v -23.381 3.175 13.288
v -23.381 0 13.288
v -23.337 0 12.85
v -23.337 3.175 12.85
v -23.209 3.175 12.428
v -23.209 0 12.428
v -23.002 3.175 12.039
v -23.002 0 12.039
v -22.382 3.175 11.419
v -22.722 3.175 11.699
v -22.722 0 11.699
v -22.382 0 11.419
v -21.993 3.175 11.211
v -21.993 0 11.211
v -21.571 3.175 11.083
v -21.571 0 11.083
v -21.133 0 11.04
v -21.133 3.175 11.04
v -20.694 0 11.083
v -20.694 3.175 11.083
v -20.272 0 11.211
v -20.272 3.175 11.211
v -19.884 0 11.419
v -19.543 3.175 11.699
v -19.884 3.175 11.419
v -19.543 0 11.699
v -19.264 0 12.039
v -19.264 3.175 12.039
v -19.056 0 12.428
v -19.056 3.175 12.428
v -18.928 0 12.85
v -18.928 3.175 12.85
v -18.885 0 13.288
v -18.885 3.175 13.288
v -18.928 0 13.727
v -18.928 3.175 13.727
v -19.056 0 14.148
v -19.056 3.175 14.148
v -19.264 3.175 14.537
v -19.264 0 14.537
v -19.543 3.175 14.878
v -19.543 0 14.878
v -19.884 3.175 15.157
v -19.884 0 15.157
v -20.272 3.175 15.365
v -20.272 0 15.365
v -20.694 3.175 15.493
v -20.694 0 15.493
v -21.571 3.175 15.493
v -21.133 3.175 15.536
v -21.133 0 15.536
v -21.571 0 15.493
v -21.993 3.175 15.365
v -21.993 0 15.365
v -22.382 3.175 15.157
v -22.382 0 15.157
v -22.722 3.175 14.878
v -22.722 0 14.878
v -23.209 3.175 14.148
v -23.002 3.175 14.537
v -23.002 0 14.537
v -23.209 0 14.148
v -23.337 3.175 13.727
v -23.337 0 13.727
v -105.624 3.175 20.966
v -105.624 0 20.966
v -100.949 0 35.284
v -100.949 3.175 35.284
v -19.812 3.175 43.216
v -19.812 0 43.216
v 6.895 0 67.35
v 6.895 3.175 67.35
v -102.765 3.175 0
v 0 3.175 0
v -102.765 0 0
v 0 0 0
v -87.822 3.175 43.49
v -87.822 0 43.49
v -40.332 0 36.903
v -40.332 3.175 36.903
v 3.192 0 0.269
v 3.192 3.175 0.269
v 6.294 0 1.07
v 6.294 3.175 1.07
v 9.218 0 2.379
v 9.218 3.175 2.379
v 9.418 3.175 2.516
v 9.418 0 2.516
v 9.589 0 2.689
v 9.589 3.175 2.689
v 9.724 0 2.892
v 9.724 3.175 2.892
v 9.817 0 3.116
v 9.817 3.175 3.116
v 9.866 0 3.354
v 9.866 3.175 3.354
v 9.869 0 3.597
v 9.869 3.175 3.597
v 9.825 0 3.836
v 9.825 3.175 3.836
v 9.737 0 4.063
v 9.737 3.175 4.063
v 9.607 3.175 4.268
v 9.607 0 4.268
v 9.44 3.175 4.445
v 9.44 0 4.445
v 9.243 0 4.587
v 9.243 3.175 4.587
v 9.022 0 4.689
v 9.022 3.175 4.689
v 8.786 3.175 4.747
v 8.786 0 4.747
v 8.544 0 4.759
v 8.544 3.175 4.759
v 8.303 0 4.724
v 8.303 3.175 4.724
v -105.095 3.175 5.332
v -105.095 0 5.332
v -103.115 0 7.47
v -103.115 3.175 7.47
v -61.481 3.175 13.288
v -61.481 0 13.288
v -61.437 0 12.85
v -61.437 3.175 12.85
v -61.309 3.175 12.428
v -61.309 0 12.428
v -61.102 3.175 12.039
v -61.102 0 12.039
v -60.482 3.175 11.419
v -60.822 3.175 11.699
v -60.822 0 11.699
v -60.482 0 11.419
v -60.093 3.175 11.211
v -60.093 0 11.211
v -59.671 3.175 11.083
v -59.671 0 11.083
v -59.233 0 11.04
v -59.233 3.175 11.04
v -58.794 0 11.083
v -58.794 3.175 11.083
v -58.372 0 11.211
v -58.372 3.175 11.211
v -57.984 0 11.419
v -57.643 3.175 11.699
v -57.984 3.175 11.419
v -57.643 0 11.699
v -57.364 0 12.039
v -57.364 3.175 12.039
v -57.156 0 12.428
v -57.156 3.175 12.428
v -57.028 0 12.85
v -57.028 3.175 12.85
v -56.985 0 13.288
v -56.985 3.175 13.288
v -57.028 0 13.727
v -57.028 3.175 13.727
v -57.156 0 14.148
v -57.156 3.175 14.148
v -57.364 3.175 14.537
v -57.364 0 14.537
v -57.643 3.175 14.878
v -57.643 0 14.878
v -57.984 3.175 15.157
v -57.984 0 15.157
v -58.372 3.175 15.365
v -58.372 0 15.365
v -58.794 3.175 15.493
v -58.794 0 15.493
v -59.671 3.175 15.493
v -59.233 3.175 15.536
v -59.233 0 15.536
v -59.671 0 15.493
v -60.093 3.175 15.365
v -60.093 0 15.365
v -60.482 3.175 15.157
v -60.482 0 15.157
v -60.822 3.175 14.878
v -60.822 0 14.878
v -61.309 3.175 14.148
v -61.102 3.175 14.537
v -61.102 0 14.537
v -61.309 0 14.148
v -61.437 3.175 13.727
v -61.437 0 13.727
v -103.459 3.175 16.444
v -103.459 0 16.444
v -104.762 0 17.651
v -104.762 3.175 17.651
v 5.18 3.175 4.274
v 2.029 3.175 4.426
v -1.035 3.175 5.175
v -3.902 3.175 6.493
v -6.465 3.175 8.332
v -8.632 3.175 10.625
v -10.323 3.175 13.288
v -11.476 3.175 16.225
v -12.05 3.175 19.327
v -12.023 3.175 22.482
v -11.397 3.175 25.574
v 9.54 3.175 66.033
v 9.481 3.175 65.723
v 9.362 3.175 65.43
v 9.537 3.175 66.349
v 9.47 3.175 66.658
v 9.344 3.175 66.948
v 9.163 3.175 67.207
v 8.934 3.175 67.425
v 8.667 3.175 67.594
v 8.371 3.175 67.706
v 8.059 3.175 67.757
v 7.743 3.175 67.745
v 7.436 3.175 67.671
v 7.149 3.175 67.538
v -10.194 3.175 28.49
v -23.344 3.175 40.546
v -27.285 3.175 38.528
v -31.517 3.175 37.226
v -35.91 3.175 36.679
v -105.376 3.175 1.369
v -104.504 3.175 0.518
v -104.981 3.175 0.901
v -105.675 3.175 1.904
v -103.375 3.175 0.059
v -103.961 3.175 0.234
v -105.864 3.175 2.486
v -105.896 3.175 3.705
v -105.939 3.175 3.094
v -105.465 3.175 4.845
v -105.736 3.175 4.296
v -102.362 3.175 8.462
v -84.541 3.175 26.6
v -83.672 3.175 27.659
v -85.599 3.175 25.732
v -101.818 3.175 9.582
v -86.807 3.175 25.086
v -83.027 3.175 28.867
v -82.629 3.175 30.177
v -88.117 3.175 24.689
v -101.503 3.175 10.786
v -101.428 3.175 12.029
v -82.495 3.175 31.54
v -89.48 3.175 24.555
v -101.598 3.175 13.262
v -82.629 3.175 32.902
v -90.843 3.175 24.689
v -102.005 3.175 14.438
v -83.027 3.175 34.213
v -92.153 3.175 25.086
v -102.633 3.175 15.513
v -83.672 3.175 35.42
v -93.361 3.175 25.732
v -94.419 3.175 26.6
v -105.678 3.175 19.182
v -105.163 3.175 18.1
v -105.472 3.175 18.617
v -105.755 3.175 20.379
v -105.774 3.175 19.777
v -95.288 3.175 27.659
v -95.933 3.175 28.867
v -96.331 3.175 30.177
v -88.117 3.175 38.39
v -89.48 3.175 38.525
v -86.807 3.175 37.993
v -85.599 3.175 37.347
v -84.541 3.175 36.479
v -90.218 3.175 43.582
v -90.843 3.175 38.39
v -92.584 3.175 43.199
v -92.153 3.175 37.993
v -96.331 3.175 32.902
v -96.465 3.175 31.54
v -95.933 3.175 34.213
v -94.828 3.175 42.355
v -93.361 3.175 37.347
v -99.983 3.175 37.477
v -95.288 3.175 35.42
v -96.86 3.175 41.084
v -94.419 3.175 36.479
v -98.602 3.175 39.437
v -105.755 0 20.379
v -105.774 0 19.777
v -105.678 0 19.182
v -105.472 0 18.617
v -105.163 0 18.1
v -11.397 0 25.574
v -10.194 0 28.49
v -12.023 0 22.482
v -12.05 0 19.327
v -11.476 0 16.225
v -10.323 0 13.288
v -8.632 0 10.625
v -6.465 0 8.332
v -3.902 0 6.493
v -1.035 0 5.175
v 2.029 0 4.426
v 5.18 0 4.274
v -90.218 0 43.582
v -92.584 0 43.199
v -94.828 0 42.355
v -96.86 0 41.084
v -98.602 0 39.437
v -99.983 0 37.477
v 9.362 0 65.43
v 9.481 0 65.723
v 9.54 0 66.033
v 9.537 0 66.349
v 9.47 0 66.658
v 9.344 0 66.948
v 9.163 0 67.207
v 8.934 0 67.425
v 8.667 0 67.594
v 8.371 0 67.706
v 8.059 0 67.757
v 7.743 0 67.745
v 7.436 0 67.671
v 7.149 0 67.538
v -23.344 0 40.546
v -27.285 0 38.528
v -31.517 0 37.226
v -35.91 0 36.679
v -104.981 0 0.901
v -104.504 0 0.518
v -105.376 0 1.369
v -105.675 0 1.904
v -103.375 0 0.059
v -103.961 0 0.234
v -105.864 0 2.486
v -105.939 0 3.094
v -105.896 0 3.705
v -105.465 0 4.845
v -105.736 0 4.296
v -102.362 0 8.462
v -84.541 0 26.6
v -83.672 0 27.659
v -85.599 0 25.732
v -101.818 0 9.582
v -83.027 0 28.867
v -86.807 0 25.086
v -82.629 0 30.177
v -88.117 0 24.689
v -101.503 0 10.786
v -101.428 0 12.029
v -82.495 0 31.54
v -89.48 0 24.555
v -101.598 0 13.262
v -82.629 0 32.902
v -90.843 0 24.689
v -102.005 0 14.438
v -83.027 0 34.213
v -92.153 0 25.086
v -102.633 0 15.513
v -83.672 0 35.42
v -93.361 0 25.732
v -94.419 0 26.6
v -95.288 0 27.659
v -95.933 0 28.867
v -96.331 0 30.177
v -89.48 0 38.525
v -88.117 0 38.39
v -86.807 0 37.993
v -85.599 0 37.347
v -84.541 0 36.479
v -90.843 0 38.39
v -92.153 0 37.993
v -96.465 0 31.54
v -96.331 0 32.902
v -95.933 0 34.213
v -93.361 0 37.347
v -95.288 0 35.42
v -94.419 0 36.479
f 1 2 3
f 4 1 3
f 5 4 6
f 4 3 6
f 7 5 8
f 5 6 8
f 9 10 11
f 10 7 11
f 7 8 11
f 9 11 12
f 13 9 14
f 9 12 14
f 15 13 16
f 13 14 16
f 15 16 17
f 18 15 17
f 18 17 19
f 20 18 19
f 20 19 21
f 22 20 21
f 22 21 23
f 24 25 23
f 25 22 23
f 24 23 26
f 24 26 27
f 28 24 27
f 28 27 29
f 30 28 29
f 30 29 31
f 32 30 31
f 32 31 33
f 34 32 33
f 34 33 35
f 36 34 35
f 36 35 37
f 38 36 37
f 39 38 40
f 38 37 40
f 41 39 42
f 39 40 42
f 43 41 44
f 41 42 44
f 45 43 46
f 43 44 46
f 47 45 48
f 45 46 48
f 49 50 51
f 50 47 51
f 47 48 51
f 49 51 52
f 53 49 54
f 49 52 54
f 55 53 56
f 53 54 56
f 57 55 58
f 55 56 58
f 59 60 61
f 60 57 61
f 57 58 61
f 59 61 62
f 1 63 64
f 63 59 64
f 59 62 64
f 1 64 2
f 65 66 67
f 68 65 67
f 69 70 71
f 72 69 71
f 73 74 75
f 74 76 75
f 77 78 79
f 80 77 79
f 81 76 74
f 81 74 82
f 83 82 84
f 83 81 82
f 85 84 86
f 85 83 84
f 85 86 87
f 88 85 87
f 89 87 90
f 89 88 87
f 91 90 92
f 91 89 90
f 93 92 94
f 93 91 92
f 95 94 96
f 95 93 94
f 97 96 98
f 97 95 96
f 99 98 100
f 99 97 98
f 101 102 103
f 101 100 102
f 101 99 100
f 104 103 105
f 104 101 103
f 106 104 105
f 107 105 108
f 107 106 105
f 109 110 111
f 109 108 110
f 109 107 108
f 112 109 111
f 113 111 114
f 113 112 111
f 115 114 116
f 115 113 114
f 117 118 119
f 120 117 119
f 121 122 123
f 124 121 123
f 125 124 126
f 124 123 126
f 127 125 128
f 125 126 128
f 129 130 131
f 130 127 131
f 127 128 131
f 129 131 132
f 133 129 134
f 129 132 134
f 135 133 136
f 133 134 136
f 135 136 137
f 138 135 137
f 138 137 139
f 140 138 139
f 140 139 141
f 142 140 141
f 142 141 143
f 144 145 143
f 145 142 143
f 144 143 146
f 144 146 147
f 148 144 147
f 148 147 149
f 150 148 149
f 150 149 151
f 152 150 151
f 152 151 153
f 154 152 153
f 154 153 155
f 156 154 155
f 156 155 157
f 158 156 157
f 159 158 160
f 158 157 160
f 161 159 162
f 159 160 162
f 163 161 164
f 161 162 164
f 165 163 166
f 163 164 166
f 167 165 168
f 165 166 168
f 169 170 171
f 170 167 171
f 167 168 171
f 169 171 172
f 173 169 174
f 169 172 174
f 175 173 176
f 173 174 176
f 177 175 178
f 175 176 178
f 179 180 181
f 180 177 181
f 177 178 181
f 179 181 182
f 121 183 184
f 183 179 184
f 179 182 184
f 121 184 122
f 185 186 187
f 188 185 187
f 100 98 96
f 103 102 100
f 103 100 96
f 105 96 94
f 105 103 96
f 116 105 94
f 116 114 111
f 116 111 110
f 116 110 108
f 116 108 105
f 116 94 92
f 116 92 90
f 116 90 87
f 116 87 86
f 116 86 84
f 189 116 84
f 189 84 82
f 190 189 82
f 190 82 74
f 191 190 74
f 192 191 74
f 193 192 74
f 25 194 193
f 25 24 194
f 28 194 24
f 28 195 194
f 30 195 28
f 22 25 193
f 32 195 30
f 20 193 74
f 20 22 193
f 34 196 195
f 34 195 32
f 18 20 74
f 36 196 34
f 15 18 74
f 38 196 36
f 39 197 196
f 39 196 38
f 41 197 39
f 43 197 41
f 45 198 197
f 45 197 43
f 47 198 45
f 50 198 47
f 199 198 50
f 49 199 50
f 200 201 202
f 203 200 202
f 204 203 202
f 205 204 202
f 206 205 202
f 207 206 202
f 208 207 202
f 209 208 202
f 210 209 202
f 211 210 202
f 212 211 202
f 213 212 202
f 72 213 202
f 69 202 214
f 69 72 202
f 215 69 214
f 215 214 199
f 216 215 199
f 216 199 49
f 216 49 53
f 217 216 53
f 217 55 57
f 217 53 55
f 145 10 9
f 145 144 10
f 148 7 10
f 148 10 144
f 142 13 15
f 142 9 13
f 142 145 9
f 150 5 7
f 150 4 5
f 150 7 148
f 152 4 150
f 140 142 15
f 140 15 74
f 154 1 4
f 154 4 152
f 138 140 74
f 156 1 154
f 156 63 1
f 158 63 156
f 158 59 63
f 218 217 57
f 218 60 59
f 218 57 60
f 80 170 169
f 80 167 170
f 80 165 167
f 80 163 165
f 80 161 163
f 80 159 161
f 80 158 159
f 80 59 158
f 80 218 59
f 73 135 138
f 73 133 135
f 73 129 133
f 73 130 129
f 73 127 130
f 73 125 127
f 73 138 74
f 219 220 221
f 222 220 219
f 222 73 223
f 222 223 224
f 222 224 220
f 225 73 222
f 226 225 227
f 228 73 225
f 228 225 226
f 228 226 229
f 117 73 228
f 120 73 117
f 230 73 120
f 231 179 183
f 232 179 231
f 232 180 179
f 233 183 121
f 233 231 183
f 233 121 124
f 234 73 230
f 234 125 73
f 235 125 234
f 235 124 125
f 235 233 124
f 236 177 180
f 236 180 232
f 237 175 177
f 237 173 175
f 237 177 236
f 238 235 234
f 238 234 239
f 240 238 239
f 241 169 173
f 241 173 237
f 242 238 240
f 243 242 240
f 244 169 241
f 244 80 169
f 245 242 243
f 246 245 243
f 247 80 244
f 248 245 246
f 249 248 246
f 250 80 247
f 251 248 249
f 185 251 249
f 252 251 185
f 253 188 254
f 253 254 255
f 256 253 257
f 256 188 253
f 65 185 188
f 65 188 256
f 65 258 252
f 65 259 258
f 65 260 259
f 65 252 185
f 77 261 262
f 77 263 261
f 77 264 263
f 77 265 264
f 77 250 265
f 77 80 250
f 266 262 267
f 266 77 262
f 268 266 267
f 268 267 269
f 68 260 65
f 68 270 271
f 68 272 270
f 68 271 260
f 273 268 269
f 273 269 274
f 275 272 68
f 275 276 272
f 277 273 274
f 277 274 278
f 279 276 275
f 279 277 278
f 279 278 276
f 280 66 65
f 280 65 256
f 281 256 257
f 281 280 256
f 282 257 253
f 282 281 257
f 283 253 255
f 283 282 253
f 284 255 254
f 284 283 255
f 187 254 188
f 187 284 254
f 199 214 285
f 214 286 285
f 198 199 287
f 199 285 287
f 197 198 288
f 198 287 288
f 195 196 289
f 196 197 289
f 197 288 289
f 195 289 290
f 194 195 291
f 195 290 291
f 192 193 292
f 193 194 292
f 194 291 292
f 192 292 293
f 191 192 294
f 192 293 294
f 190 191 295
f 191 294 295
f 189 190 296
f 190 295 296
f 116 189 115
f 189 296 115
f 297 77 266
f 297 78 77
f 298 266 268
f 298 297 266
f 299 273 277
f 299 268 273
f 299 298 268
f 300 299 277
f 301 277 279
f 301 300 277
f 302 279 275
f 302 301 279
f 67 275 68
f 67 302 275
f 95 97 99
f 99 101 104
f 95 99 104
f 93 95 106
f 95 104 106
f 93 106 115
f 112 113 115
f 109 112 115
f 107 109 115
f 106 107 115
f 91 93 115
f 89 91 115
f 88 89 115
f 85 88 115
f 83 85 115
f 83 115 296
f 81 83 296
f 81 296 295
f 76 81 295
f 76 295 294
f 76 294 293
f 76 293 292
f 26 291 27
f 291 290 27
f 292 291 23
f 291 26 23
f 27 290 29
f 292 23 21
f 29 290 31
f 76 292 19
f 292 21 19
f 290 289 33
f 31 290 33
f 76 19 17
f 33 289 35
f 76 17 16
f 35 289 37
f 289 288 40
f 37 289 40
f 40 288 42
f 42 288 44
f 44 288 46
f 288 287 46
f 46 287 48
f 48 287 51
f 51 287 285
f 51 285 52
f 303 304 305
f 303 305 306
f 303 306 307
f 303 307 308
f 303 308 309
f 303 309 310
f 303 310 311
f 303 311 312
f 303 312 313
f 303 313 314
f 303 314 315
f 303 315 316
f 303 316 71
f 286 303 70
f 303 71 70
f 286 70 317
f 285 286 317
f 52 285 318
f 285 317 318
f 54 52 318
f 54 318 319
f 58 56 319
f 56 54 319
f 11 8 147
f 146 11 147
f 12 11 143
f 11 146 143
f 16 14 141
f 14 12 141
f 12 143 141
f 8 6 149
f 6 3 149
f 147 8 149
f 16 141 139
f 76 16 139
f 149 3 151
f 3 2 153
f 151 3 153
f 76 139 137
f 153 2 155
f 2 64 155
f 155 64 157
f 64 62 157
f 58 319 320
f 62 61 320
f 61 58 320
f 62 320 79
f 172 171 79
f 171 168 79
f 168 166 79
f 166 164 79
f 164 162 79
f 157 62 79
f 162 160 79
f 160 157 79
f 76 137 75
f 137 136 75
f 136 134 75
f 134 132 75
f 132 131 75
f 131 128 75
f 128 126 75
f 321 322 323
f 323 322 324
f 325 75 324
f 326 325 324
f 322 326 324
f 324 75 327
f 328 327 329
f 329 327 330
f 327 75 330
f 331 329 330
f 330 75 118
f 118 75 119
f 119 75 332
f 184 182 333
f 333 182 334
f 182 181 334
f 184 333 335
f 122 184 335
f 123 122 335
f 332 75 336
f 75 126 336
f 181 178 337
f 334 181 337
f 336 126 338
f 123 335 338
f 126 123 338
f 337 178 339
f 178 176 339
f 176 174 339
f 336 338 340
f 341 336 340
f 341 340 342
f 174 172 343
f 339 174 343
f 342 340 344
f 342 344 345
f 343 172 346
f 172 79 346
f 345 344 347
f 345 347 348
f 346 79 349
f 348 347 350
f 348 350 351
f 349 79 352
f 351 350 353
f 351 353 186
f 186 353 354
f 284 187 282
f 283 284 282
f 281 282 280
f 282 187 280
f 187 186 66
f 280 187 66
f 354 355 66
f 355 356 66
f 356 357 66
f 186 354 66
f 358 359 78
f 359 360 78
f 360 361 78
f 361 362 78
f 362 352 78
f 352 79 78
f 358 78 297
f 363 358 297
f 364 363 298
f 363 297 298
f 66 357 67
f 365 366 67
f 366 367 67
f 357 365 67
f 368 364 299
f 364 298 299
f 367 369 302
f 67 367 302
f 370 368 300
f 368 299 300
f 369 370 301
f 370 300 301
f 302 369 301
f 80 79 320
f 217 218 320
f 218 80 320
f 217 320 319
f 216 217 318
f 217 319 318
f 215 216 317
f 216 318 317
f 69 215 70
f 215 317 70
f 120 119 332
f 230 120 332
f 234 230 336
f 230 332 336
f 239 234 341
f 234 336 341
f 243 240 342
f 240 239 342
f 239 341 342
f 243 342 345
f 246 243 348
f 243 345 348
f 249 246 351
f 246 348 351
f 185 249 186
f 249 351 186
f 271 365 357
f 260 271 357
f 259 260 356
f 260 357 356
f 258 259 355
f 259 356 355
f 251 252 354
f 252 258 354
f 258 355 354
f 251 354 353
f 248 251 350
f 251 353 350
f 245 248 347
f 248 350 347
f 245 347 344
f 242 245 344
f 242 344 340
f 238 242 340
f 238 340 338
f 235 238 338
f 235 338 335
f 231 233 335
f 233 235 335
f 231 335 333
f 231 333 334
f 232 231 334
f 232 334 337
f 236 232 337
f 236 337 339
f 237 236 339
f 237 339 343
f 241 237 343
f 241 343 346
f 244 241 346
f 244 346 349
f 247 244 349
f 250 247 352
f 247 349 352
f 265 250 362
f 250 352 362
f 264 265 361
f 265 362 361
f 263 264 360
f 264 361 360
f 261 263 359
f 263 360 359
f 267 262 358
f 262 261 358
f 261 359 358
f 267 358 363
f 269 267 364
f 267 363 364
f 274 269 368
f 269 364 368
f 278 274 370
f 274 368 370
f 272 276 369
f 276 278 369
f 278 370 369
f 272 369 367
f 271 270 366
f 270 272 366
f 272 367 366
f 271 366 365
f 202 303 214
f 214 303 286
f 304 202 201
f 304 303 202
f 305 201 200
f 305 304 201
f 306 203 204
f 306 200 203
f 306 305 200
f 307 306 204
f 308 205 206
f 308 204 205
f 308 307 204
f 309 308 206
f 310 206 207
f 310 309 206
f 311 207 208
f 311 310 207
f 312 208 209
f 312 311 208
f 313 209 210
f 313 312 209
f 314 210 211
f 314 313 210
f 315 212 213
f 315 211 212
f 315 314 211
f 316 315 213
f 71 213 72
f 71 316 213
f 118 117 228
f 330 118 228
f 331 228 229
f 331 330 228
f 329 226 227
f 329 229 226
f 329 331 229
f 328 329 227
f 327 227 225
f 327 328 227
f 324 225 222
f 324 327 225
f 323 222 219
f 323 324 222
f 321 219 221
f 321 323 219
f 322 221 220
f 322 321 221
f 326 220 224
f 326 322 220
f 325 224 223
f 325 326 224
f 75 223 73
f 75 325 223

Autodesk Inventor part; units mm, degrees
ref_plane "YZ Plane" through (0, 0, 0) normal (1, 0, 0) x (0, 1, 0)
ref_plane "XZ Plane" through (0, 0, 0) normal (0, 1, 0) x (-1, 0, 0)
ref_plane "XY Plane" through (0, 0, 0) normal (0, 0, 1) x (1, 0, 0)
sketch "Sketch1" plane through (0, 0, 0) normal (0, 1, 0) x (-1, 0, 0)
  line L0 (103.4591, 16.4441) -> (104.7625, 17.6511)
  arc A0 (104.7625, 17.6511) -> (105.6235, 20.966) centre (102.6053, 19.9807) ccw
  line L1 (105.6235, 20.966) -> (100.9494, 35.2839)
  arc A1 (100.9494, 35.2839) -> (87.8224, 43.4902) centre (89.4801, 31.5396) ccw
  line L2 (87.8224, 43.4902) -> (40.332, 36.9027)
  arc A2 (19.8124, 43.2164) -> (40.332, 36.9027) centre (36.8421, 62.0618) ccw
  line L3 (19.8124, 43.2164) -> (-6.8947, 67.3504)
  arc A3 (-6.8947, 67.3504) -> (-9.362, 65.4298) centre (-7.959, 66.1726) ccw
  line L4 (-9.362, 65.4298) -> (10.1942, 28.4903)
  arc A4 (-8.303, 4.7241) -> (10.1942, 28.4903) centre (-4.3971, 20.7654) ccw
  arc A5 (-8.303, 4.7241) -> (-9.218, 2.3787) centre (-8.6034, 3.4901) ccw
  arc A6 (-9.218, 2.3787) -> (0, 0) centre (0, 19.05) ccw
  line L5 (0, 0) -> (102.7651, 0)
  arc A7 (102.7651, 0) -> (105.0946, 5.3323) centre (102.7651, 3.175) ccw
  line L6 (105.0946, 5.3323) -> (103.1146, 7.4705)
  arc A8 (103.4591, 16.4441) -> (103.1146, 7.4705) centre (107.7737, 11.785) ccw
  circle A9 centre (89.4801, 31.5396) radius 6.985
  circle A10 centre (21.1327, 13.2882) radius 2.2479
  circle A11 centre (59.2327, 13.2882) radius 2.2479
  point P0 (0, 0)
  point P1 (-8.303, 4.7241)
  point P2 (-9.218, 2.3787)
  point P3 (0, 0)
  point P4 (102.7651, 0)
  point P5 (105.0946, 5.3323)
  point P6 (105.6235, 20.966)
  point P7 (19.8124, 43.2164)
  point P8 (-9.362, 65.4298)
  point P9 (10.1942, 28.4903)
extrude "Plate1" add sketch "Sketch1" along normal blind 3.175
equation "\"d0\" = Thickness"
equation "\"BendRadius\" = Thickness"
equation "\"BendReliefWidth\" = Thickness"
equation "\"BendReliefDepth\" = 0.5 * Thickness"
equation "\"CornerReliefSize\" = 4 * Thickness"
equation "\"MinimumRemnant\" = 2 * Thickness"
equation "\"TransitionRadius\" = BendRadius"
equation "\"JacobiRadiusSize\" = BendRadius"
equation "\"GapSize\" = Thickness"
equation "\"Thickness\" = 3.175"
properties part number "hook-top-plate" material "Aluminum 6061"
